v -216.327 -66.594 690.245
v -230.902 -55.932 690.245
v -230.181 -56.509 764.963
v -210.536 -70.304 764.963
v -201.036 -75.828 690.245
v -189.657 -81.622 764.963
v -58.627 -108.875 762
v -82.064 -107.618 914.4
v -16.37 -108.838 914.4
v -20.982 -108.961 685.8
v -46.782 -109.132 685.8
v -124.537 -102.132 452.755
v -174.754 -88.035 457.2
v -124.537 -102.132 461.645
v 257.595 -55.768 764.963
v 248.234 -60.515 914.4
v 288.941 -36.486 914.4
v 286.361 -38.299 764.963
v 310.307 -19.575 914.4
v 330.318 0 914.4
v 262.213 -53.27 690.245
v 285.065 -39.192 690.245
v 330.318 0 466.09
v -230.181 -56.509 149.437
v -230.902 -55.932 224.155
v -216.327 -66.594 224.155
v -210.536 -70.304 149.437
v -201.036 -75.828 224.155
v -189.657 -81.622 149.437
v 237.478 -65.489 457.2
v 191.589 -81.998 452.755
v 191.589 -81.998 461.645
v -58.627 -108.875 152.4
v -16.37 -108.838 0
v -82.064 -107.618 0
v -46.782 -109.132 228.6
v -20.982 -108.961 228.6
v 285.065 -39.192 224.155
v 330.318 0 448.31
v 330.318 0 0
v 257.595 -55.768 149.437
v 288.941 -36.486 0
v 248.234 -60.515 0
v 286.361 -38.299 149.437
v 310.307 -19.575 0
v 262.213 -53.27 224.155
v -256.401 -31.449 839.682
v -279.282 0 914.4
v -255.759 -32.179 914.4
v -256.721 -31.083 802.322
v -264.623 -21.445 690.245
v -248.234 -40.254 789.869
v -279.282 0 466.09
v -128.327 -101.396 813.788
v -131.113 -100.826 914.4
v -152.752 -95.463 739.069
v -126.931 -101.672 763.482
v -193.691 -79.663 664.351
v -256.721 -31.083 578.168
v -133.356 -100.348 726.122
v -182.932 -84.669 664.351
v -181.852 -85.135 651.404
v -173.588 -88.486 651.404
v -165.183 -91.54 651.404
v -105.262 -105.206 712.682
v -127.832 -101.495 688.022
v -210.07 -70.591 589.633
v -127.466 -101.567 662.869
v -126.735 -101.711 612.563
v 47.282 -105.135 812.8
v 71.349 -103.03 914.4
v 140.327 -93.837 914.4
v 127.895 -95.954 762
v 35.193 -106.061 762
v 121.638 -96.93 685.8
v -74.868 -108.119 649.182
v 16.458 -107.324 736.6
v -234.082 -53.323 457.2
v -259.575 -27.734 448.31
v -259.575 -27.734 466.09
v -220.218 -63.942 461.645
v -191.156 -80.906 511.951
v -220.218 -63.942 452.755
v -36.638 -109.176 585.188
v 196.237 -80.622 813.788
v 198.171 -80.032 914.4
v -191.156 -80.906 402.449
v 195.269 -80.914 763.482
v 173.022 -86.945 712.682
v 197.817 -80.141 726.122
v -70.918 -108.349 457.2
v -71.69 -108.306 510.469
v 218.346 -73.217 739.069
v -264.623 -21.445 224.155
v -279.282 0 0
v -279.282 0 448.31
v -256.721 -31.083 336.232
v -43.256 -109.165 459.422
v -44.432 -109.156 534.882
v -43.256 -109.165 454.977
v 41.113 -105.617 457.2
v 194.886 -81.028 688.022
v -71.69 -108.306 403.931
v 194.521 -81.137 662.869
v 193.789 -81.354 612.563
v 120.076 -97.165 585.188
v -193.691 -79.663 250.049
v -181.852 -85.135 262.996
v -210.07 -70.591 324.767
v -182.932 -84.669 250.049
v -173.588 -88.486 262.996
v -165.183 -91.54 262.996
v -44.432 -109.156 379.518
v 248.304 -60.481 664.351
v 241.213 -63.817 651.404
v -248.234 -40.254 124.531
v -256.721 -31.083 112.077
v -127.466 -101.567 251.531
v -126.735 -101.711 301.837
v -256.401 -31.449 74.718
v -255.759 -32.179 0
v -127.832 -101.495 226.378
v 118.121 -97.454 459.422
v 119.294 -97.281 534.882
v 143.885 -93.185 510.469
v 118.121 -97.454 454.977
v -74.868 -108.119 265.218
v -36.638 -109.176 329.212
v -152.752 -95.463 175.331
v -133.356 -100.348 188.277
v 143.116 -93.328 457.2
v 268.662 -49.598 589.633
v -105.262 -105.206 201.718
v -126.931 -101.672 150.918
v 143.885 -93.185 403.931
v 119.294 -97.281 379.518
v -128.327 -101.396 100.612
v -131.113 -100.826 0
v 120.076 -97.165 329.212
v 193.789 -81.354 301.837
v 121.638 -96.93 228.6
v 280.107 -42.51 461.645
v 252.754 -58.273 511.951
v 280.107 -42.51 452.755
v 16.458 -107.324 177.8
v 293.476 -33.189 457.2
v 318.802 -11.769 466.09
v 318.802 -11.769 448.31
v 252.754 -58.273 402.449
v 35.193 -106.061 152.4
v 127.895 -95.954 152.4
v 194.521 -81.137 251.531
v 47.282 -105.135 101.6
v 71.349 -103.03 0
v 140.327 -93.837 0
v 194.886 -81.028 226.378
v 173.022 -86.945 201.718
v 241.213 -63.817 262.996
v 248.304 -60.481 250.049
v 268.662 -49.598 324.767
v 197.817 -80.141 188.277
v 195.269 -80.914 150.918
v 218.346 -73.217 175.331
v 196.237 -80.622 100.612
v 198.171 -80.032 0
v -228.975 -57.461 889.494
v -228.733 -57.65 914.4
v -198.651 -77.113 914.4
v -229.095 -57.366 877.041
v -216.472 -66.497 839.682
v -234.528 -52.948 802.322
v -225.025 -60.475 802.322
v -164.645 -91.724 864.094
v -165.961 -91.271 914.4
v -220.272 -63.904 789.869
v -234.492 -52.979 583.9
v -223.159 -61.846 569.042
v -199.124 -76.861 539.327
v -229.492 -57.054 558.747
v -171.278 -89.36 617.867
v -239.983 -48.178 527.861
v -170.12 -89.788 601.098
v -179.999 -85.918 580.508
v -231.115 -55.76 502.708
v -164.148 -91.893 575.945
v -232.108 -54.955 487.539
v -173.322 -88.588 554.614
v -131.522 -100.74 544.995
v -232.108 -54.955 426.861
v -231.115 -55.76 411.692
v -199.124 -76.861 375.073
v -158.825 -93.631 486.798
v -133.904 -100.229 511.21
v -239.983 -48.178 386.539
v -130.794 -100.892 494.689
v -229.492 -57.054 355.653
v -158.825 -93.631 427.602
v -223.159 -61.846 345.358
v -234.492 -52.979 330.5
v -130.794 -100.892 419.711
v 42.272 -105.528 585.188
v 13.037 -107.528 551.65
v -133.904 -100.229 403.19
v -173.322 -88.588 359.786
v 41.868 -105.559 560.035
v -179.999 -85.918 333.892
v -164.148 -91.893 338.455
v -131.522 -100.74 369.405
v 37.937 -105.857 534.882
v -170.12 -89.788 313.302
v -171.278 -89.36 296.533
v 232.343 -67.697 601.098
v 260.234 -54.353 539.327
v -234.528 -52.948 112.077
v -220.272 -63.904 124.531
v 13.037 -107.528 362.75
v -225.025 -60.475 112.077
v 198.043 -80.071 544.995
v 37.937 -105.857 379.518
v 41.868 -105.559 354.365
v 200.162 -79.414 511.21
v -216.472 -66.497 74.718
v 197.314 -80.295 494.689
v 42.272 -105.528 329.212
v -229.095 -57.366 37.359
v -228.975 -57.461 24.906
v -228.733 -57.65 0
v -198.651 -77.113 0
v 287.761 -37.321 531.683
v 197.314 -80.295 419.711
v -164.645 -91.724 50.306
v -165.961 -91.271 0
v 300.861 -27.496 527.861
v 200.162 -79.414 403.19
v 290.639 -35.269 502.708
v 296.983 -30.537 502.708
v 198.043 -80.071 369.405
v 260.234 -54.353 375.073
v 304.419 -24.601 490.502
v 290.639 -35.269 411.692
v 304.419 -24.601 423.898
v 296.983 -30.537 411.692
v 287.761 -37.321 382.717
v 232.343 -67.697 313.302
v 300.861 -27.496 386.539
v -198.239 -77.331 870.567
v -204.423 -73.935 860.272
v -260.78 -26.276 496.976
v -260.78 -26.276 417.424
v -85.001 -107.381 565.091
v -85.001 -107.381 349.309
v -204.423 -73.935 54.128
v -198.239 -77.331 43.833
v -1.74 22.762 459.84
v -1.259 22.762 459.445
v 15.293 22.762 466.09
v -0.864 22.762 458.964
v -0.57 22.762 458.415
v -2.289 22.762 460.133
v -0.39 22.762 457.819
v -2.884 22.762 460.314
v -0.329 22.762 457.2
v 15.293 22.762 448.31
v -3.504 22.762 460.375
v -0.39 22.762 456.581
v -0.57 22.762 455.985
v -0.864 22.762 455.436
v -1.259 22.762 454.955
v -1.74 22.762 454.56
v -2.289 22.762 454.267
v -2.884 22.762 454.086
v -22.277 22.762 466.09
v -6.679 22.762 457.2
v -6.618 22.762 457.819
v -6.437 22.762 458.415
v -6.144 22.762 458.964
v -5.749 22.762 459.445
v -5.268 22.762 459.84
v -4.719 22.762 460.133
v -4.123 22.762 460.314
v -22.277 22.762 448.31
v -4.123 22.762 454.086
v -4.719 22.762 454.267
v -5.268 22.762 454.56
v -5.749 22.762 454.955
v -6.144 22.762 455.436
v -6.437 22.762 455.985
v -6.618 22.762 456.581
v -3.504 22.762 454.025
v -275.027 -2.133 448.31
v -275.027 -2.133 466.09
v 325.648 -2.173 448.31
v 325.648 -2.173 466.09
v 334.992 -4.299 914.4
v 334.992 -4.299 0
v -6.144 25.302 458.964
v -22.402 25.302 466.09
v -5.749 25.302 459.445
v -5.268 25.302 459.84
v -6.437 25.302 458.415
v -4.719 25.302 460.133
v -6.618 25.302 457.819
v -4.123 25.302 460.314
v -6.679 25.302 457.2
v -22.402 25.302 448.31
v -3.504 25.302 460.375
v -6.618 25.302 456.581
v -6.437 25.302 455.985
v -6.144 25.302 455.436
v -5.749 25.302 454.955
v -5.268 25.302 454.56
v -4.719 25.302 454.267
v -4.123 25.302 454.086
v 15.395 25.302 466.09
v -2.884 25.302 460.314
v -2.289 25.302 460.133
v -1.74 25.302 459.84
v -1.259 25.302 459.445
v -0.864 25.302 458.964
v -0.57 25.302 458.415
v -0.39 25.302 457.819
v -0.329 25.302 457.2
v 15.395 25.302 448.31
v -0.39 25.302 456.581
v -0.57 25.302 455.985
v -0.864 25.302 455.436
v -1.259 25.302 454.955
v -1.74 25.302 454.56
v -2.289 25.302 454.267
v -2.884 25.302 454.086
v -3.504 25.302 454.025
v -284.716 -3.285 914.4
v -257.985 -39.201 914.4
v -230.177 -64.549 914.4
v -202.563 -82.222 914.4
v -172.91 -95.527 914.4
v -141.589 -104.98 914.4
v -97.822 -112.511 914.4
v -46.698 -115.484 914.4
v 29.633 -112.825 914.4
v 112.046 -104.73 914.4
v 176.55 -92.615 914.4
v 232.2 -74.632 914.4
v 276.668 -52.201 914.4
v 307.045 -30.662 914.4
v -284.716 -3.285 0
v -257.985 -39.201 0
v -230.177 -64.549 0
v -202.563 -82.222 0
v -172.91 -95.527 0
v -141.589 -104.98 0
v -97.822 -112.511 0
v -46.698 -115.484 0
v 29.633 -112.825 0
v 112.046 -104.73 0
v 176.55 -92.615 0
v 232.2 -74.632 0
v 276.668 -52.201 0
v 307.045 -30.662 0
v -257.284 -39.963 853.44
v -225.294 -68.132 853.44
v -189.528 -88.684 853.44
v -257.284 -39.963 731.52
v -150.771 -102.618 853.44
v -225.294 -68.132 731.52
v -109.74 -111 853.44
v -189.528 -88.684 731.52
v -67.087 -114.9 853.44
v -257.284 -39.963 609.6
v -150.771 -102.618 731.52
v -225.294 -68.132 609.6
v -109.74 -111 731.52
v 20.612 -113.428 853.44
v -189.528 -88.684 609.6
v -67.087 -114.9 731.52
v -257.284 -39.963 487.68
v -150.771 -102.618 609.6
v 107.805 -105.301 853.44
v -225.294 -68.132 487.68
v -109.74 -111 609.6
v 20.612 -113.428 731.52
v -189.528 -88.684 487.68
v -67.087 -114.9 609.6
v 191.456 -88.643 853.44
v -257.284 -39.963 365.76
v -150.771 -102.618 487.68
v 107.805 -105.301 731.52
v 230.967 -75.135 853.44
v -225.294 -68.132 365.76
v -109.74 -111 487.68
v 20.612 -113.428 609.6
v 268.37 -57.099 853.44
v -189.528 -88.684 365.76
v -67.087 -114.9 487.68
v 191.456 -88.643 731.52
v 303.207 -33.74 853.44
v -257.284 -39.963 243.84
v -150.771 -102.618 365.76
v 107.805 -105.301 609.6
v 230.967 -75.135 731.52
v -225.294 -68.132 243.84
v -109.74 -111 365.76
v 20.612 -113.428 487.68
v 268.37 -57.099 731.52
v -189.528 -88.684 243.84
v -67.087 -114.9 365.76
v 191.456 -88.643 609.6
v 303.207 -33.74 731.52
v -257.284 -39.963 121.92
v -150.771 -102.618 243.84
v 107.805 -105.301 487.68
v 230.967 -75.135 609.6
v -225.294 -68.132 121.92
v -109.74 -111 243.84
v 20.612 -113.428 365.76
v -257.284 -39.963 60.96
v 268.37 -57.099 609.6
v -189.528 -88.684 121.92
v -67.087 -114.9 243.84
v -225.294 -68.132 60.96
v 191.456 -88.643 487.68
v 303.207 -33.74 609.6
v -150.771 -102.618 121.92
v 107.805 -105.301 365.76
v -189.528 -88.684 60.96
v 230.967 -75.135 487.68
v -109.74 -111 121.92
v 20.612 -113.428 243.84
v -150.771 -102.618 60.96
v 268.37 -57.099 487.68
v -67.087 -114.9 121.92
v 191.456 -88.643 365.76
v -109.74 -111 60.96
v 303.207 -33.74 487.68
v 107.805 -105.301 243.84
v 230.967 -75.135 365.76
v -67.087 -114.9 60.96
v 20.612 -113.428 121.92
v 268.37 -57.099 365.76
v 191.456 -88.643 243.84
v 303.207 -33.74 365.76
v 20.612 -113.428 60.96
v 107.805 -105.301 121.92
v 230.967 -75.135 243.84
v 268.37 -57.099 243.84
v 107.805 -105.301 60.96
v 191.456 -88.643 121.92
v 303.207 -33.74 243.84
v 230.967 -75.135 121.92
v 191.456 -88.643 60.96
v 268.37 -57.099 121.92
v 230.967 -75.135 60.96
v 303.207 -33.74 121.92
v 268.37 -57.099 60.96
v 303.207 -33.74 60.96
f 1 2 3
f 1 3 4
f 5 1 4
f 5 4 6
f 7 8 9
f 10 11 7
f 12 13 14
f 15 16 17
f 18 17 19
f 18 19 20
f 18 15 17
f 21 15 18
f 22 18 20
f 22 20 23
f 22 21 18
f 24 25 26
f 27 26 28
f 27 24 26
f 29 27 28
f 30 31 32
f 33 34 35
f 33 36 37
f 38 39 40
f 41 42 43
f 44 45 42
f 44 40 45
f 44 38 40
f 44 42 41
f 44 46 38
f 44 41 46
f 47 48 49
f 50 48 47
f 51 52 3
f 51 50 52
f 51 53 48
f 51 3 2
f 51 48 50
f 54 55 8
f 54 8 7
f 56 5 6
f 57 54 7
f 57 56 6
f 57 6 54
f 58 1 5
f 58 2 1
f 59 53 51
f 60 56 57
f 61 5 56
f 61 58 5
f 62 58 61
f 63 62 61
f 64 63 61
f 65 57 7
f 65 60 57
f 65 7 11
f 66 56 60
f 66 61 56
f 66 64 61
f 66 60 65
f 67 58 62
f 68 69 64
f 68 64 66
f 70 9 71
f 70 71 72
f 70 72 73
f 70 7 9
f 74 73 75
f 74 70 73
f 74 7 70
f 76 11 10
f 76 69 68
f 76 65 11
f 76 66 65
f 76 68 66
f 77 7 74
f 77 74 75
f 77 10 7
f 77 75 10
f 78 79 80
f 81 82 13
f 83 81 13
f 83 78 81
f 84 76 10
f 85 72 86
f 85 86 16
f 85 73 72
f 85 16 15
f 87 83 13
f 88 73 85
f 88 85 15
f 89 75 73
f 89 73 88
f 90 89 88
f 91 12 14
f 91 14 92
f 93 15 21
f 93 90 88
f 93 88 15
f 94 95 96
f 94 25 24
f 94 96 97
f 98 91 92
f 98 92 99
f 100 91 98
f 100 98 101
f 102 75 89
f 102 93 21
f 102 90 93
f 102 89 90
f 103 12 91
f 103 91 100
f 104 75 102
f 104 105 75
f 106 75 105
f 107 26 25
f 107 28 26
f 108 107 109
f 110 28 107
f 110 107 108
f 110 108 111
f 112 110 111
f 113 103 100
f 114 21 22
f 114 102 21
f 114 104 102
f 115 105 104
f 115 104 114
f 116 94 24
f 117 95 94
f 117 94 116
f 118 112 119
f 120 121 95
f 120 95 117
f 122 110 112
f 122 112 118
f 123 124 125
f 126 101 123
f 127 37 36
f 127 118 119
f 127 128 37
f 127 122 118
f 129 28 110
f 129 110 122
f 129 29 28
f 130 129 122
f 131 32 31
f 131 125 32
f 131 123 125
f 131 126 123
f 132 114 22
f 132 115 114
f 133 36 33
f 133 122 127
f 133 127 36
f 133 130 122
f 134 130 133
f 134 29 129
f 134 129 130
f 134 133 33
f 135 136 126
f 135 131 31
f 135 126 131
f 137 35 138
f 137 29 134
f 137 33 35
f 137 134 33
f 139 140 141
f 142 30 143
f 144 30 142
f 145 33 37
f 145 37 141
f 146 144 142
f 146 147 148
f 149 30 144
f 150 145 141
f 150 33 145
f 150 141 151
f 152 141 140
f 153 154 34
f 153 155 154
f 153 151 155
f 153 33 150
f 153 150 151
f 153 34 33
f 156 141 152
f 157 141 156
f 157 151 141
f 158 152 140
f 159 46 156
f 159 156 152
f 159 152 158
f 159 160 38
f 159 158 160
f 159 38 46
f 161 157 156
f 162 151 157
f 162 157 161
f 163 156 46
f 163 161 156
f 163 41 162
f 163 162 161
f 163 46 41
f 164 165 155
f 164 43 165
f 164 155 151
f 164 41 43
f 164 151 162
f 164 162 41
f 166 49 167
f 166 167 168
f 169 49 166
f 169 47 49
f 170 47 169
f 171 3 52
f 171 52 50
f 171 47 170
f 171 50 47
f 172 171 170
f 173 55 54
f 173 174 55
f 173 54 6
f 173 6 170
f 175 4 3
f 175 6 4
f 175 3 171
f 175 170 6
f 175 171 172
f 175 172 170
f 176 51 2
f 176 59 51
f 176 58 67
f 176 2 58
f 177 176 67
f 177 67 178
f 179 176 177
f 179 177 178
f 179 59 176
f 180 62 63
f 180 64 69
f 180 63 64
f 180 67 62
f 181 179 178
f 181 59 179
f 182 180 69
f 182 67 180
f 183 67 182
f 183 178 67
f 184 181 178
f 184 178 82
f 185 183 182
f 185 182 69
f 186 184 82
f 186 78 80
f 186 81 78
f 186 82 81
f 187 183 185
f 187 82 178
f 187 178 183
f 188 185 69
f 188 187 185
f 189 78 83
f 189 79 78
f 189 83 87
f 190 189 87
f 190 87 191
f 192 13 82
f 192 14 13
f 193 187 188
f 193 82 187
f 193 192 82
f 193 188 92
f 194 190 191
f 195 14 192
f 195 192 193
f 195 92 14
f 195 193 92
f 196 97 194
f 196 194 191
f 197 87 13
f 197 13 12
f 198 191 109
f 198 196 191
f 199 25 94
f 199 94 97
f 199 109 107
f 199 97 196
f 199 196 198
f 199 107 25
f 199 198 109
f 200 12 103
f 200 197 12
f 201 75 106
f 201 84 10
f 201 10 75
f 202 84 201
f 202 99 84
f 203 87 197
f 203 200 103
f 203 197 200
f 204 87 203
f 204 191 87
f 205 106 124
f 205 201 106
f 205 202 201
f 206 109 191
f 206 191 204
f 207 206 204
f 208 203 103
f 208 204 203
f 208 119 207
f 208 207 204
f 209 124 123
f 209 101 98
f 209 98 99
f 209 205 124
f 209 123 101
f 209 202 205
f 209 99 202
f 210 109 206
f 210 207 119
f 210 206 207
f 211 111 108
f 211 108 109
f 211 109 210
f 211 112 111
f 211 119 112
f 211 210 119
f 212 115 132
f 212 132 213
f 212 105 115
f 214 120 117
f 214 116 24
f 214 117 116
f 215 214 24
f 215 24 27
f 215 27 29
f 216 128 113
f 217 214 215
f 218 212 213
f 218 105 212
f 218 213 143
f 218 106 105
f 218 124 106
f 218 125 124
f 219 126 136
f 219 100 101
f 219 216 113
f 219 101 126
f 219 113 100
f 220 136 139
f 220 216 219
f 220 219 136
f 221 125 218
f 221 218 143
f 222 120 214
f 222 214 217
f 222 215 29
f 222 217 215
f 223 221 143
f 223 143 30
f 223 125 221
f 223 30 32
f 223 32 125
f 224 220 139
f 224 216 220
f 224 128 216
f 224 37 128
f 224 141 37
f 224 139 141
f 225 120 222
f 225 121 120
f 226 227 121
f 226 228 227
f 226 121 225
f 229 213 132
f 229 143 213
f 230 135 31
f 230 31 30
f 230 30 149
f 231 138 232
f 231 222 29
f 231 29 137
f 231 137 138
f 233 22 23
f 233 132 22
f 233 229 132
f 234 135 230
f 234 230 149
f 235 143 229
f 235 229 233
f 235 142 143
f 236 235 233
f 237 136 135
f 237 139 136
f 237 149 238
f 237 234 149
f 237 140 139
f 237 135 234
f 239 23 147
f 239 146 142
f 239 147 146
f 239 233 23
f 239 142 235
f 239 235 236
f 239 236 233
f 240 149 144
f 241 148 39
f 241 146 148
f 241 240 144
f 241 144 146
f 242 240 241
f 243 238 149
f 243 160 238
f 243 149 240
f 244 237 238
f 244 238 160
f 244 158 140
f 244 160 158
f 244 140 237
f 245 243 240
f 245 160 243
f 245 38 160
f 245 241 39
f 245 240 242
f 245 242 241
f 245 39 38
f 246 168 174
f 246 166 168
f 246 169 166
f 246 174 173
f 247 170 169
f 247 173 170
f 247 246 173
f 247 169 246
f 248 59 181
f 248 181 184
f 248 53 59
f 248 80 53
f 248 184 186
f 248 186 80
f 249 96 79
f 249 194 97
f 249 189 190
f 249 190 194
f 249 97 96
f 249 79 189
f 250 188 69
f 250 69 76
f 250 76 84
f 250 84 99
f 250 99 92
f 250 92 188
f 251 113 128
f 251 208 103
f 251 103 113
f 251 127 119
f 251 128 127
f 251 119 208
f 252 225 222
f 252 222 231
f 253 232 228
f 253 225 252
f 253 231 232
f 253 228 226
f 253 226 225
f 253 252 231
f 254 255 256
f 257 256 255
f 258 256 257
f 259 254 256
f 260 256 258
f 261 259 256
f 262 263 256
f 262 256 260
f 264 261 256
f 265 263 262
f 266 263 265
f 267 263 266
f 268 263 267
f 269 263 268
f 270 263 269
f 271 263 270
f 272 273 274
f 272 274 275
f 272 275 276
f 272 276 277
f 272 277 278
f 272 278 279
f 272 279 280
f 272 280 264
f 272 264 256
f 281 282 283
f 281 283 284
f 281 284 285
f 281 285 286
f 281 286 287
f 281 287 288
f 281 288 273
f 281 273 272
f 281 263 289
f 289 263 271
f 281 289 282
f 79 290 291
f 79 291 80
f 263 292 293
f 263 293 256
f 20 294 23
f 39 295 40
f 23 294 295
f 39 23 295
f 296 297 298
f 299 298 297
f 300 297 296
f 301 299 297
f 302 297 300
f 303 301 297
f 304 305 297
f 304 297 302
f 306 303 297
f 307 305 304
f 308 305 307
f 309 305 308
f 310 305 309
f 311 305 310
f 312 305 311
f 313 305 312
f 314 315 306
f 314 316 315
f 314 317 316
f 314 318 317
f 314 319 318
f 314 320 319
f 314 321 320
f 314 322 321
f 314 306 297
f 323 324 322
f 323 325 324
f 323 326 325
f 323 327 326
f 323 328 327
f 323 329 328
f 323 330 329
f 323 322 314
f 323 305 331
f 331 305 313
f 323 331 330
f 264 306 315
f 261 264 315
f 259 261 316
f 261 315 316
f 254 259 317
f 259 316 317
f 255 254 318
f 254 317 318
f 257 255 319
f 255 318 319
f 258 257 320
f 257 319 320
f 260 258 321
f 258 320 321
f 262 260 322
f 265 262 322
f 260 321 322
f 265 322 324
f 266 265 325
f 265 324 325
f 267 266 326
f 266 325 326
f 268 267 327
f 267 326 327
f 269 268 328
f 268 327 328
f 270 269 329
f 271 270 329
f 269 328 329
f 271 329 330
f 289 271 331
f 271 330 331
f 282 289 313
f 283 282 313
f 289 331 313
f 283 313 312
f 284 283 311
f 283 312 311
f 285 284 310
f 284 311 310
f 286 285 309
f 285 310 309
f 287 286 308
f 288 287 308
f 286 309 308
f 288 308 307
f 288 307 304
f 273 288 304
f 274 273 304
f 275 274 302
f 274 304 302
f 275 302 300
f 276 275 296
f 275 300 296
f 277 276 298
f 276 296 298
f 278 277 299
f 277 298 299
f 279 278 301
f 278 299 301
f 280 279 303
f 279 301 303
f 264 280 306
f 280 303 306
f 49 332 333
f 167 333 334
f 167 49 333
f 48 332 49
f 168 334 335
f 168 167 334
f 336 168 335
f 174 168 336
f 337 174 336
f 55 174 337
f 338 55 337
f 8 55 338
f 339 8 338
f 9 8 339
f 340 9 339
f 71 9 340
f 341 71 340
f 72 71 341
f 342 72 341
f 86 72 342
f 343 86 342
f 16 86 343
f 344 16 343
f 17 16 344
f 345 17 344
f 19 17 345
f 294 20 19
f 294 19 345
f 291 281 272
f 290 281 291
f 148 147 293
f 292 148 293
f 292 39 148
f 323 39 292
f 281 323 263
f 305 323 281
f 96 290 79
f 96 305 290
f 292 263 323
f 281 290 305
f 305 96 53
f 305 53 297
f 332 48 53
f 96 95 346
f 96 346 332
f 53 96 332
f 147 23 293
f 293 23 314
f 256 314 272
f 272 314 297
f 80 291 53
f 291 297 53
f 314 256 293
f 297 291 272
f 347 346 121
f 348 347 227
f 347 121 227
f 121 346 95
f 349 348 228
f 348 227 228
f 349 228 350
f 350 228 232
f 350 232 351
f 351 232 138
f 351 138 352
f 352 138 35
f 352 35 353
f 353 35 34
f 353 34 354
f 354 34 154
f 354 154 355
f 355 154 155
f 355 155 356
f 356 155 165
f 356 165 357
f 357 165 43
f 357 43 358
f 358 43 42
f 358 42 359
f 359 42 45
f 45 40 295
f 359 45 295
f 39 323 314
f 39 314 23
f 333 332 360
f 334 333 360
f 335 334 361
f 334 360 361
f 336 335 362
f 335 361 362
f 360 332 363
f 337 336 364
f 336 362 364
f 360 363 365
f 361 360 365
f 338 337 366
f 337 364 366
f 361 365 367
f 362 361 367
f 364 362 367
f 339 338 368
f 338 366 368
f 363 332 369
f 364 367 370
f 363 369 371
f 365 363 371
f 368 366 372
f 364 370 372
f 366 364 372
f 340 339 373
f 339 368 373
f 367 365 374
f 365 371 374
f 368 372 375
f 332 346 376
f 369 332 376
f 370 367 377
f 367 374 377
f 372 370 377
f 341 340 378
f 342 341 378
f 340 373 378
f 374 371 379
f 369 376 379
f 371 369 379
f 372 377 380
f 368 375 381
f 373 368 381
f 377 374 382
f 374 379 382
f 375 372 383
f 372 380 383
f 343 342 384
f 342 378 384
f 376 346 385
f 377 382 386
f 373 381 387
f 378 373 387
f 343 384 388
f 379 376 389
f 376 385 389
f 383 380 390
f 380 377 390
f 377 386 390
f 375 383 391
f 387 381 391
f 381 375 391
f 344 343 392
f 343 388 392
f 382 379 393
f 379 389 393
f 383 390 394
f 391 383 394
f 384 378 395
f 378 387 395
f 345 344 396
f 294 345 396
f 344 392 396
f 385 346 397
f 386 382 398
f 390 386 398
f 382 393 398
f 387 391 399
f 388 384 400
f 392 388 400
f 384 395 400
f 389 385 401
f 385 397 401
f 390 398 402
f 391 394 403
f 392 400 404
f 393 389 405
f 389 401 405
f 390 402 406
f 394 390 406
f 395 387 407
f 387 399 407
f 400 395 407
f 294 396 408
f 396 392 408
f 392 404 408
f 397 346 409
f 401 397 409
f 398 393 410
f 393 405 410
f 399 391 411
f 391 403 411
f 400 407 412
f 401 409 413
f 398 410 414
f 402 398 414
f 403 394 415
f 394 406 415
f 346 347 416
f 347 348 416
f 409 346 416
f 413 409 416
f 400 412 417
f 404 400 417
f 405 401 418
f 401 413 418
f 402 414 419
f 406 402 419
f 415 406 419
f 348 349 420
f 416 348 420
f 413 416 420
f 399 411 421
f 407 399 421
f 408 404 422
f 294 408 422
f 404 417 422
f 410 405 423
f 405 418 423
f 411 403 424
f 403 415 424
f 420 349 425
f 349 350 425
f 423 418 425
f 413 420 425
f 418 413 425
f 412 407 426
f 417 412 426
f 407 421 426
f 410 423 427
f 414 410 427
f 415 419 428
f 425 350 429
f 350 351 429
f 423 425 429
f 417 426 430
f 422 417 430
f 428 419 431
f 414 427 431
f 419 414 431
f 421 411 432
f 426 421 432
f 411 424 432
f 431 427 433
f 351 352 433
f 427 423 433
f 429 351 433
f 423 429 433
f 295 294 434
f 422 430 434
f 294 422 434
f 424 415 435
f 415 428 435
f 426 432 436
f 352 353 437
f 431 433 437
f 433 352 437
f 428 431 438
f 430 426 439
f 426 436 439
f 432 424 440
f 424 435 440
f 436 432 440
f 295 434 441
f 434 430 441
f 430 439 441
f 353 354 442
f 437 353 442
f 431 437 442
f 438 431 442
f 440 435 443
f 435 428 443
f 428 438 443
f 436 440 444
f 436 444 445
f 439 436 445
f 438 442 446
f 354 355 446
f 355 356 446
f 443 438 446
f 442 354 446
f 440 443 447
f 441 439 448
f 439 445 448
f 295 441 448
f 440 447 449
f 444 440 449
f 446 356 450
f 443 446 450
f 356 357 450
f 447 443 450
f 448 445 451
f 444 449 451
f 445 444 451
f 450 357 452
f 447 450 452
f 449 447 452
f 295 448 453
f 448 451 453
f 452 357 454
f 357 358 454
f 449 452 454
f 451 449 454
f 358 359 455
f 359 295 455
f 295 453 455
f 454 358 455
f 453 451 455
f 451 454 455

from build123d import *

# Parameters (mm, degrees)
EXTRUDE_THIN1_DEPTH      = 914.4
EXTRUDE_THIN4_DEPTH      = 8.89
EXTRUDE_THIN4_DEPTH_BACK = 8.89
SKETCH3_R                = 3.175
CUT_EXTRUDE1_DEPTH       = 2.54


# Read off the part's stored shape, not the designer's step: Extrude-Thin1
with BuildPart() as part:
    # Extrude-Thin1 outline → Extrude-Thin1 (new body)
    with BuildSketch(Plane.XY):
        with BuildLine():
            Line((-279.281860465, 0), (-284.71613549, -3.284989338))
            add(Edge.make_bspline(
                [(-284.71613549, -3.284989338), (-276.411980171, -17.022344077), (-267.229584336, -29.202445288), (-247.338960844, -50.724026352), (-236.631464335, -60.064270549), (-213.95664245, -76.199351518), (-201.990613754, -82.994245551), (-177.065513095, -94.373588626), (-164.106747152, -98.958909243), (-137.435337906, -106.278074265), (-123.722298844, -109.012434747), (-95.757540475, -112.988332753), (-81.50544134, -114.229947253), (-38.248820893, -116.240274168), (-8.742183636, -115.296775681), (27.950717972, -112.960198025), (35.278792072, -112.434976439), (49.893241244, -111.309686323), (57.188433916, -110.707434609), (79.013267611, -108.733315329), (93.482153818, -107.194182238), (136.449530574, -101.516065662), (164.51055488, -96.31826732), (204.929228546, -84.805234416), (218.123016692, -80.347603619), (243.810120822, -69.922590111), (256.303500739, -63.954946432), (280.436440477, -50.243453576), (292.075782995, -42.499330863), (314.337533524, -24.980842308), (324.959480174, -15.206510631), (334.991900126, -4.298658156)],
                knots=[0, 0, 0, 0, 0.0625, 0.0625, 0.125, 0.125, 0.1875, 0.1875, 0.25, 0.25, 0.3125, 0.3125, 0.375, 0.375, 0.5, 0.5, 0.53125, 0.53125, 0.5625, 0.5625, 0.625, 0.625, 0.75, 0.75, 0.8125, 0.8125, 0.875, 0.875, 0.9375, 0.9375, 1, 1, 1, 1], degree=3))
            Line((334.991900126, -4.298658156), (330.318139535, 0))
            add(Edge.make_bspline(
                [(-279.281860465, 0), (-210.683269989, -113.480918379), (31.412039024, -116.473776402), (256.595063057, -80.156178281), (330.318139535, 0)],
                knots=[0, 0, 0, 0, 0.529840137, 1, 1, 1, 1], degree=3))
        make_face()
    extrude(amount=EXTRUDE_THIN1_DEPTH)

    # Sketch2 → Extrude-Thin4 (add, two sides: drawn at the far end of the back side and taken through both)
    with BuildSketch(Plane.XY.offset(457.2).offset(-EXTRUDE_THIN4_DEPTH_BACK)):
        Polygon((-259.425934823, -32.895811523), (-279.281860465, 0), (-22.402060356, 25.301754569), (15.394596297, 25.301754569), (330.318139535, 0), (318.3059636, -16.837453823), (316.23823425, -15.362294396), (325.647772165, -2.172955429), (15.292725411, 22.761754569), (-22.277271764, 22.761754569), (-275.027395985, -2.133241486), (-257.251364532, -31.583239983), align=None)
    extrude(amount=EXTRUDE_THIN4_DEPTH + EXTRUDE_THIN4_DEPTH_BACK)

    # Sketch3 → Cut-Extrude1 (cut)
    with BuildSketch(Plane(origin=(0, 25.301754569, 0), x_dir=(1, 0, 0), z_dir=(0, 1, 0))):
        with Locations(Location((-3.503732029, -457.2, 0), (0, 0, 270))):
            Circle(SKETCH3_R)
    extrude(amount=-CUT_EXTRUDE1_DEPTH, mode=Mode.SUBTRACT)


solid = part.part
